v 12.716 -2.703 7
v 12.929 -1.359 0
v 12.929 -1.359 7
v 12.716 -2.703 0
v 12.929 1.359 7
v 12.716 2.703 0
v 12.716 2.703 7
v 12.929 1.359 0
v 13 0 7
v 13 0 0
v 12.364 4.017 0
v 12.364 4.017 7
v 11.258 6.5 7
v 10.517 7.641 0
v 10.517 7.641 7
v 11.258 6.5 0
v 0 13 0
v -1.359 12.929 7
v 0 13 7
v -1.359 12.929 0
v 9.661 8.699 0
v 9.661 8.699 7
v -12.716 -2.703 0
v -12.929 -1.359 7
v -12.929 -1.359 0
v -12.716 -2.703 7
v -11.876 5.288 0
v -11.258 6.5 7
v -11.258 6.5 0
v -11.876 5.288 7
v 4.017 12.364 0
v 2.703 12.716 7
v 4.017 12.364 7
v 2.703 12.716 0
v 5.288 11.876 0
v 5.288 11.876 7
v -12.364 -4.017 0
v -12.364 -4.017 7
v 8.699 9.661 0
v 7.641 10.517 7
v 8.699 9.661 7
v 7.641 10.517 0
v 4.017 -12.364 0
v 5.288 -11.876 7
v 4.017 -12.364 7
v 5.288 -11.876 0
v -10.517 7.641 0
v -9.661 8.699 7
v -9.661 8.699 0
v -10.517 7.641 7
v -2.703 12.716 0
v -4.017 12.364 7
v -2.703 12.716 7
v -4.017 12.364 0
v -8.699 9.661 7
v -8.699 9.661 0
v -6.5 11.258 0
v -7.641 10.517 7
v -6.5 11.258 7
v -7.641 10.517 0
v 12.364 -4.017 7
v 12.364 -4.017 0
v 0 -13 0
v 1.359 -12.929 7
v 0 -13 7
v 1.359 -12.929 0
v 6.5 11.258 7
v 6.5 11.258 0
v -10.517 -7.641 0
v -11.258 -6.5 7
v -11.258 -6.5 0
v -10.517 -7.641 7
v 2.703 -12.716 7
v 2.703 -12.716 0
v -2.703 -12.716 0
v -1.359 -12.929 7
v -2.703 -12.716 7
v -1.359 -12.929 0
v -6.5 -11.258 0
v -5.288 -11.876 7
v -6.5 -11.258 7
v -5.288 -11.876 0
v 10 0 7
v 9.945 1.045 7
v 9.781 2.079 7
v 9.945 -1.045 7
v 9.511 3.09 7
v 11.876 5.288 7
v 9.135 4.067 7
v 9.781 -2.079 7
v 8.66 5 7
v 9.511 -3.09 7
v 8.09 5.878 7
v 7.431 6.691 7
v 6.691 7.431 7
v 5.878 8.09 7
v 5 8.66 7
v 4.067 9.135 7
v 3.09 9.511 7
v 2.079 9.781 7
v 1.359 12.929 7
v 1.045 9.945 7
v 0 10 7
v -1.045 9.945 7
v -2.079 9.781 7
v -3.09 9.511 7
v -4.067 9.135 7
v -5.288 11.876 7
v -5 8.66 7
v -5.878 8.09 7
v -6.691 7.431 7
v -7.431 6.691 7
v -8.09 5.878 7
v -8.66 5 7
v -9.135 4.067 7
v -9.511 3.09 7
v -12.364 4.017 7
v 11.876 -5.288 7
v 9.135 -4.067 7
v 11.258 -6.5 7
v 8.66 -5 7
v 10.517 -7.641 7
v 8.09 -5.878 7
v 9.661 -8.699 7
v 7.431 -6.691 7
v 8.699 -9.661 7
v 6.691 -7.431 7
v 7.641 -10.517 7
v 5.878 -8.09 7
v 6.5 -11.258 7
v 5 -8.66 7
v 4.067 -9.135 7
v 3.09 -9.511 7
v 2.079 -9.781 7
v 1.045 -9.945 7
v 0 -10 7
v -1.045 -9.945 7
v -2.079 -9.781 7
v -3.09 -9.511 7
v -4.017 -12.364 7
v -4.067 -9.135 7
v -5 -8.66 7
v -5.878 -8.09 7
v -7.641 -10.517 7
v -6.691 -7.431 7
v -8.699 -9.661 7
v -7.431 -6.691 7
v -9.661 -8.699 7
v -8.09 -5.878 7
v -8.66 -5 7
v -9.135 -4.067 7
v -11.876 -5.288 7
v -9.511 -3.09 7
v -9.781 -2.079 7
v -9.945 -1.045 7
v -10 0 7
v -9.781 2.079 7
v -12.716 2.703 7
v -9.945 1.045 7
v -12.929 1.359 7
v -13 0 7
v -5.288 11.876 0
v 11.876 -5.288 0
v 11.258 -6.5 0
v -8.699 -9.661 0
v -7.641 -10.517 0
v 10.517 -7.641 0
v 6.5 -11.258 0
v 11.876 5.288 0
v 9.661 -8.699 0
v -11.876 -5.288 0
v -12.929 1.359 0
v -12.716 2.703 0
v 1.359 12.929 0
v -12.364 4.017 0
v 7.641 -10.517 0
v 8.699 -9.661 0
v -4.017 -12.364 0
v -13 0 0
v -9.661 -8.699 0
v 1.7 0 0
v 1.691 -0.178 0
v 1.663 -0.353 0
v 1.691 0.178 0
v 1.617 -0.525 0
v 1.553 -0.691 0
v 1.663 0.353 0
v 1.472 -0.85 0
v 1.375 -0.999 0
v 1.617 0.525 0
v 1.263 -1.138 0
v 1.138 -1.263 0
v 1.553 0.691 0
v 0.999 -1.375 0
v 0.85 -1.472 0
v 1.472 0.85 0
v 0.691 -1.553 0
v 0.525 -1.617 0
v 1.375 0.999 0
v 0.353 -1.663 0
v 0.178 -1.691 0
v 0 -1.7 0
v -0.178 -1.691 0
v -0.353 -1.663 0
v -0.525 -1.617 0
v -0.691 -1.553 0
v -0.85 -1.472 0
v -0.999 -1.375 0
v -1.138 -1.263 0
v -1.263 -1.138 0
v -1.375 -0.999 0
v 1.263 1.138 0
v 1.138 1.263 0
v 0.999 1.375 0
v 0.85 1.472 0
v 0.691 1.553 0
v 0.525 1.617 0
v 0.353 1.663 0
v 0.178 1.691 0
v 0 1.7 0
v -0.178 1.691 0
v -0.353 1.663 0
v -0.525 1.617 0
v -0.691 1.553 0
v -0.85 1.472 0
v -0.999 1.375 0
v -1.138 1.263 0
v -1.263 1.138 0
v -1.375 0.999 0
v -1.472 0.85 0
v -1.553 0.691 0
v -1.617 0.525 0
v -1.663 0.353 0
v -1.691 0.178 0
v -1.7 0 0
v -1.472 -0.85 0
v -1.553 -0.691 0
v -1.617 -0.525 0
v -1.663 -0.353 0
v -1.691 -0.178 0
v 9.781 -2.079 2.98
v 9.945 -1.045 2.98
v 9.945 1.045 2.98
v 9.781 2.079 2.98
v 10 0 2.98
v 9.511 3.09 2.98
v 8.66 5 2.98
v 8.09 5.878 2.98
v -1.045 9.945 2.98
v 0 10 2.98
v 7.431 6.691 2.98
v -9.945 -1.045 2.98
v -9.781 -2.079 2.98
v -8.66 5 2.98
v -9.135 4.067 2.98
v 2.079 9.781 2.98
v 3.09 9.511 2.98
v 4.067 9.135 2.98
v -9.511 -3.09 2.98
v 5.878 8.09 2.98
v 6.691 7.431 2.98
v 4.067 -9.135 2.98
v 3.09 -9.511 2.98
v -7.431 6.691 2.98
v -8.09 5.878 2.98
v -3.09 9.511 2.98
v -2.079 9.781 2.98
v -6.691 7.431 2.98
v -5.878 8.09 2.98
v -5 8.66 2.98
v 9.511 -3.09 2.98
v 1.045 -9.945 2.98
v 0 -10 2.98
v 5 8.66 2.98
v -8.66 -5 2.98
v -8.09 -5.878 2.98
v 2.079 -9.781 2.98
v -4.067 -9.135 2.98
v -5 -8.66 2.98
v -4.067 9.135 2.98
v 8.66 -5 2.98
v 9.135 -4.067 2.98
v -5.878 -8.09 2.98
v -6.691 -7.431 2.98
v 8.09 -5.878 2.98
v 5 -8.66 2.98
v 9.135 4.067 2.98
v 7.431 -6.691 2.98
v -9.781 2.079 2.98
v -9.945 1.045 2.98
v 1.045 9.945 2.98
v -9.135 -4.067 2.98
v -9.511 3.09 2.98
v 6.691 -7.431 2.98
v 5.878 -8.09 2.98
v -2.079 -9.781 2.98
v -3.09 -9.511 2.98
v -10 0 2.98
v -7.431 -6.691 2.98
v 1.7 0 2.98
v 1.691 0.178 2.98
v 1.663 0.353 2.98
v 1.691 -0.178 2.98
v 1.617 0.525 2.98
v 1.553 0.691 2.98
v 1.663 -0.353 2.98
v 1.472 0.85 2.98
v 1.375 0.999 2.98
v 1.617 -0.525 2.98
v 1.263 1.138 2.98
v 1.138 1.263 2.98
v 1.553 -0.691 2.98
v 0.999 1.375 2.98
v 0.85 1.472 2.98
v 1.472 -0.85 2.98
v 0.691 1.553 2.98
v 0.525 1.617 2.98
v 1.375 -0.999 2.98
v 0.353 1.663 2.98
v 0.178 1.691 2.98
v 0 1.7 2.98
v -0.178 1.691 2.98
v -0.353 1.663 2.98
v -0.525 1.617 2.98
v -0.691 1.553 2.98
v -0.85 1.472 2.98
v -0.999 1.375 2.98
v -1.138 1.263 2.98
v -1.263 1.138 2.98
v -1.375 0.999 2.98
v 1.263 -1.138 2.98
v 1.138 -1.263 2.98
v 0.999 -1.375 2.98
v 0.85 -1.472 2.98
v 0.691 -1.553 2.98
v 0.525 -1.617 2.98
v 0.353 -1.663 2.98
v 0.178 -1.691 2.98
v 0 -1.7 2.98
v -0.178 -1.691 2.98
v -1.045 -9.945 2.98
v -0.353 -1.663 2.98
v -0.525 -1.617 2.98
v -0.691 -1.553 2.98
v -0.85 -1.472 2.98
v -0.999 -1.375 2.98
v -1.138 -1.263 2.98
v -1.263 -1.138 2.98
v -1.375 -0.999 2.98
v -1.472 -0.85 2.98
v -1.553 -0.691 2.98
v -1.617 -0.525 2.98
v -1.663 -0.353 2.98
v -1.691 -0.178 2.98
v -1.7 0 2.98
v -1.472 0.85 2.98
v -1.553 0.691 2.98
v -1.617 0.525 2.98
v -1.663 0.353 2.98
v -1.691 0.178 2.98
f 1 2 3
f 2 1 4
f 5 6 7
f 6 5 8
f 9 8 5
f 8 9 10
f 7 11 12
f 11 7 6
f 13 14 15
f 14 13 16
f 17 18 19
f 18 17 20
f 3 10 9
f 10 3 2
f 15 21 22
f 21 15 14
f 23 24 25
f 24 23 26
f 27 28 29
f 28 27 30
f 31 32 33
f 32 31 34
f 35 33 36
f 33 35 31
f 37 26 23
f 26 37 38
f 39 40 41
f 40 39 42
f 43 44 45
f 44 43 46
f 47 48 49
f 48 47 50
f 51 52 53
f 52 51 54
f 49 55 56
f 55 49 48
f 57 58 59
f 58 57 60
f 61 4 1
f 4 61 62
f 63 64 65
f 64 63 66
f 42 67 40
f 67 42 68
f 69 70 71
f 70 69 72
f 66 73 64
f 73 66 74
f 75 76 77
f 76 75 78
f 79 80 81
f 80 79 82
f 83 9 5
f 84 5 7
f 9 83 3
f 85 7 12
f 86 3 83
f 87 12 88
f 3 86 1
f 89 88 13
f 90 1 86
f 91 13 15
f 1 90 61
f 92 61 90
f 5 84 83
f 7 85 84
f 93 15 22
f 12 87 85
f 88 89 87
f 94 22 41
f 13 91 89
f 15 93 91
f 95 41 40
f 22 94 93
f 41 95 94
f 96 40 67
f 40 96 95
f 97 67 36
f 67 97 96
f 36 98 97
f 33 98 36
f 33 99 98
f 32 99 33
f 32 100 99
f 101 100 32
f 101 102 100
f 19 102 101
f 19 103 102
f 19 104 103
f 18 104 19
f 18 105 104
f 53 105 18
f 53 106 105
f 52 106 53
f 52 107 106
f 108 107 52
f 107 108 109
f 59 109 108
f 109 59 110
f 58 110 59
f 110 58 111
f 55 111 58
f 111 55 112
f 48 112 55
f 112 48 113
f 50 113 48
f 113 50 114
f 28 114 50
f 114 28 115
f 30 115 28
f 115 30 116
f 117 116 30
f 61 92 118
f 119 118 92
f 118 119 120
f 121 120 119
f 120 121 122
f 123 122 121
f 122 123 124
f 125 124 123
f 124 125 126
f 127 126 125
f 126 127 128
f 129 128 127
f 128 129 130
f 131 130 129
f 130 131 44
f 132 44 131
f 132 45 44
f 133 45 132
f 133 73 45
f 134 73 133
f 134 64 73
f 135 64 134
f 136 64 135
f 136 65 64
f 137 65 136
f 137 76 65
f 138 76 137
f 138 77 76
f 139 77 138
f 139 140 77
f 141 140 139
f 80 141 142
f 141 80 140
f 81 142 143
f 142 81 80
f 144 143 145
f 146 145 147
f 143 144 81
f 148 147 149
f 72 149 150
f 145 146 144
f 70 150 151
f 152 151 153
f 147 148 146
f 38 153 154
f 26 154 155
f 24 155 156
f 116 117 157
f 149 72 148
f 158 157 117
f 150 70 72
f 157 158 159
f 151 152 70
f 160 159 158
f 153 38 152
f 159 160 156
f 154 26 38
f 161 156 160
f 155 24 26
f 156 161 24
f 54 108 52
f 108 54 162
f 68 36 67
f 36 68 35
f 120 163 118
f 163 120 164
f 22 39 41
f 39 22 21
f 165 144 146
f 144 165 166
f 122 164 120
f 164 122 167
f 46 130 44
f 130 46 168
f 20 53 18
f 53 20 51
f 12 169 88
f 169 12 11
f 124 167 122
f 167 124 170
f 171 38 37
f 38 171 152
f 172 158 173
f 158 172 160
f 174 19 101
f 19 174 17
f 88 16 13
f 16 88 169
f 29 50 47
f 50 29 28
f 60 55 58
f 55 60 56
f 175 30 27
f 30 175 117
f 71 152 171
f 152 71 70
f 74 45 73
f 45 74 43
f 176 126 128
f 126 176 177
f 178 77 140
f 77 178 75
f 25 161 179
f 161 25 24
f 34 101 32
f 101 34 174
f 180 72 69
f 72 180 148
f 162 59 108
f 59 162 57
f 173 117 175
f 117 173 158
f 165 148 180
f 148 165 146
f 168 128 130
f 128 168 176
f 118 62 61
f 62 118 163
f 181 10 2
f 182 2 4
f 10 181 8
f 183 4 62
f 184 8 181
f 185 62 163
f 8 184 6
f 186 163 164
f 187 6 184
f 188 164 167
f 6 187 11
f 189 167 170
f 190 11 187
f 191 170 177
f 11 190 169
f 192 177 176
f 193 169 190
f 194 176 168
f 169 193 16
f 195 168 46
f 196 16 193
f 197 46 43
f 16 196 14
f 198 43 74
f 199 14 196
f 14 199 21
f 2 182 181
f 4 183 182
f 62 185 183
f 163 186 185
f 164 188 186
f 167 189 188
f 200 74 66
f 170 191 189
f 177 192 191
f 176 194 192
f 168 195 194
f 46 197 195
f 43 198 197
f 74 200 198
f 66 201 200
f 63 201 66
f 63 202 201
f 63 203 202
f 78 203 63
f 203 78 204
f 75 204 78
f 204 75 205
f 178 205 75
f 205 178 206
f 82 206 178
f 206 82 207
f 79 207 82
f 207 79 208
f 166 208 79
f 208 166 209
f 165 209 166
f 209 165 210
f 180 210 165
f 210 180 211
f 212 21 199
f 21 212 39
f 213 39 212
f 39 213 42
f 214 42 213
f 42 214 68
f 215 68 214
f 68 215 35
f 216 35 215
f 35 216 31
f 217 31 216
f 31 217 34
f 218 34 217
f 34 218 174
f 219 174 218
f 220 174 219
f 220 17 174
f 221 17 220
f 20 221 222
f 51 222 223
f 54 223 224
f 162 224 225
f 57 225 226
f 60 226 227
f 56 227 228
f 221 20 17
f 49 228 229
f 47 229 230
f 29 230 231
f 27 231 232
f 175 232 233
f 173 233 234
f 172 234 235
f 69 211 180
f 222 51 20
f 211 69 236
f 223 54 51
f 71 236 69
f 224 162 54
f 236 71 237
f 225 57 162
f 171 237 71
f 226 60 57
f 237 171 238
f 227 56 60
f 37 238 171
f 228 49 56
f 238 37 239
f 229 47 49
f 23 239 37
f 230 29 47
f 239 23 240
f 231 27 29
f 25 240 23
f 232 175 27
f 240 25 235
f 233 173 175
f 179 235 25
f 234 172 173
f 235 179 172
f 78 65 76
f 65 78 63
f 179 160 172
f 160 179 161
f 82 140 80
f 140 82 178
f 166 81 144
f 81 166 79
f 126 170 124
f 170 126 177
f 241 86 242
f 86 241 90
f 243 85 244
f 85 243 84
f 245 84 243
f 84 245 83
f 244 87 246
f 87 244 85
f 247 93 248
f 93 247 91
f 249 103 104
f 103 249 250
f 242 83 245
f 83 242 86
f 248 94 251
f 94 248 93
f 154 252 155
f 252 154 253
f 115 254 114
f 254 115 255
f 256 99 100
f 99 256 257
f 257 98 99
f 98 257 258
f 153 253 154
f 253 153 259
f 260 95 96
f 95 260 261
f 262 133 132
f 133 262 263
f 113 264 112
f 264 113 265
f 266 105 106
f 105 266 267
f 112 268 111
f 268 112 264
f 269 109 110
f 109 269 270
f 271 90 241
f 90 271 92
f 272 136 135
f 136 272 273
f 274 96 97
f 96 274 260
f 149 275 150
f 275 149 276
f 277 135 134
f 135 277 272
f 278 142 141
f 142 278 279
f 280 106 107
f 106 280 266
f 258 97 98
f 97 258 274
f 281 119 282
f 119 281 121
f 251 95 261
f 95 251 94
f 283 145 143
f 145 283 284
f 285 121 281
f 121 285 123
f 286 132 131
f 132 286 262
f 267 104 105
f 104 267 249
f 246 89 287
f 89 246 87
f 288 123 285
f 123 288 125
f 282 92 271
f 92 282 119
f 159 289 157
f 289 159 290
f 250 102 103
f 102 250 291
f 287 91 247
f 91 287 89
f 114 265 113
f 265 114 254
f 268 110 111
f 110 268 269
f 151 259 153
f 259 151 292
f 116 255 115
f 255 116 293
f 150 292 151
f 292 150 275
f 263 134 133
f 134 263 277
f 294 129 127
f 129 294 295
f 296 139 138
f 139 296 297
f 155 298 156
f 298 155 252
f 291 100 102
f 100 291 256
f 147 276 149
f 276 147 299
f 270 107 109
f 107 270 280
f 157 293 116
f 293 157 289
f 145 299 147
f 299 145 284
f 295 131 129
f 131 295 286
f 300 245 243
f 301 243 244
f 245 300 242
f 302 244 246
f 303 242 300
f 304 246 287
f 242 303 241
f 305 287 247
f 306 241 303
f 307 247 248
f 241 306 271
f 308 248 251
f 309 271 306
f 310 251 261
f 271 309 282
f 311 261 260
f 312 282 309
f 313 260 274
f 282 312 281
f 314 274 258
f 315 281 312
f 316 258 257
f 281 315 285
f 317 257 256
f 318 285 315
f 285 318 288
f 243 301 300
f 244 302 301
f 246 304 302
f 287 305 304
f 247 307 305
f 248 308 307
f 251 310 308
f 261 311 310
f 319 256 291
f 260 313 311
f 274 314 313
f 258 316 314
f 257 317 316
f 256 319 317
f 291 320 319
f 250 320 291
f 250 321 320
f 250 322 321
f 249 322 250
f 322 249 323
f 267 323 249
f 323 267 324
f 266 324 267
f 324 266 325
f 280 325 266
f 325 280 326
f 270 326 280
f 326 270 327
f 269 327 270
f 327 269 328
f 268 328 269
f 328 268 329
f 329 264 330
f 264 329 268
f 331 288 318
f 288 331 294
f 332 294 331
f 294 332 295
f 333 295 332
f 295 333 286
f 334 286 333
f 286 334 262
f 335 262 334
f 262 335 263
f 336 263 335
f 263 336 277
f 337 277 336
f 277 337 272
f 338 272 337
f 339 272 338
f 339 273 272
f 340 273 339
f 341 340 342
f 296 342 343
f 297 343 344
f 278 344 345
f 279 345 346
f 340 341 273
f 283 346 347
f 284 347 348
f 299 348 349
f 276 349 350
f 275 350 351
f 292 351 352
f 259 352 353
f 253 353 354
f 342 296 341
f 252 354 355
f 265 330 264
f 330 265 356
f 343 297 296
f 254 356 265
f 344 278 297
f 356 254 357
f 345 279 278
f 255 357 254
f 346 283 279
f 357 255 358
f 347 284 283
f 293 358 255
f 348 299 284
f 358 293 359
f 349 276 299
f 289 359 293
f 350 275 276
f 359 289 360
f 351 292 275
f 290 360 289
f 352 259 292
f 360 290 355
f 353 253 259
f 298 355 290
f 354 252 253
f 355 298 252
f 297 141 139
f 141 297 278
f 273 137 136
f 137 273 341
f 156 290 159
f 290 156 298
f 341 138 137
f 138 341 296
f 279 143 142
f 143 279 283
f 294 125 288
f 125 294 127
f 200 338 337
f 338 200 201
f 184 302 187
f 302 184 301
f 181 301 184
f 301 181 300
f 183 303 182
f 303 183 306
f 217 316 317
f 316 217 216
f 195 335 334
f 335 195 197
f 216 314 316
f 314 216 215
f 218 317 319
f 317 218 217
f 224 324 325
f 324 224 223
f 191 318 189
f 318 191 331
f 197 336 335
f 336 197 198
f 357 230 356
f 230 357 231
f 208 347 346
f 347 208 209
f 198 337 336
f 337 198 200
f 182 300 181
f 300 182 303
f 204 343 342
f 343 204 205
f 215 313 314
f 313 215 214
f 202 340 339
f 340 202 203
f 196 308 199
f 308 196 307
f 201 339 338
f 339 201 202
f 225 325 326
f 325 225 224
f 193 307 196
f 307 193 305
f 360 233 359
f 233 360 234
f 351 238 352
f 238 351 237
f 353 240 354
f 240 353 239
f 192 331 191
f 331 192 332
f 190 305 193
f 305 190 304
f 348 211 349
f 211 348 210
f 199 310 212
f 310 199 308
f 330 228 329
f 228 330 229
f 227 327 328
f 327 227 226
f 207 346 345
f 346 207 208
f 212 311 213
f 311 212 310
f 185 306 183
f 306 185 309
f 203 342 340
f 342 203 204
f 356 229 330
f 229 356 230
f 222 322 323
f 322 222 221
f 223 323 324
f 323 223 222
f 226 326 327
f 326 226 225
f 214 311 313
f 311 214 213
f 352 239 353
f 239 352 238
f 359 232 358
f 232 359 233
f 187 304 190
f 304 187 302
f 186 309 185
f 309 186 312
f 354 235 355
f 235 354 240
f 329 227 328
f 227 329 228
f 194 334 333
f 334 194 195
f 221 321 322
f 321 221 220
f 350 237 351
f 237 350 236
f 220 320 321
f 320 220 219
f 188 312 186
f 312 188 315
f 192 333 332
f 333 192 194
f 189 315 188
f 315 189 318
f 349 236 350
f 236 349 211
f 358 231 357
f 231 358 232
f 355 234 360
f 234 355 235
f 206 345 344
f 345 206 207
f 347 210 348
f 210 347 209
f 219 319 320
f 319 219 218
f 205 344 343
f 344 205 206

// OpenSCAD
// Recessed magnet cup.
$fn = 60;
eps = 0.02;
magnet_d = 20;
wall = 3;
outer_d = magnet_d+2*wall;
height = wall+4;
difference() {
    cylinder(d=outer_d,h=height);
    translate([0,0,wall-eps]) cylinder(d=magnet_d,h=height-wall+2*eps);
    translate([0,0,-eps]) cylinder(d=3.4,h=wall+2*eps);
}
